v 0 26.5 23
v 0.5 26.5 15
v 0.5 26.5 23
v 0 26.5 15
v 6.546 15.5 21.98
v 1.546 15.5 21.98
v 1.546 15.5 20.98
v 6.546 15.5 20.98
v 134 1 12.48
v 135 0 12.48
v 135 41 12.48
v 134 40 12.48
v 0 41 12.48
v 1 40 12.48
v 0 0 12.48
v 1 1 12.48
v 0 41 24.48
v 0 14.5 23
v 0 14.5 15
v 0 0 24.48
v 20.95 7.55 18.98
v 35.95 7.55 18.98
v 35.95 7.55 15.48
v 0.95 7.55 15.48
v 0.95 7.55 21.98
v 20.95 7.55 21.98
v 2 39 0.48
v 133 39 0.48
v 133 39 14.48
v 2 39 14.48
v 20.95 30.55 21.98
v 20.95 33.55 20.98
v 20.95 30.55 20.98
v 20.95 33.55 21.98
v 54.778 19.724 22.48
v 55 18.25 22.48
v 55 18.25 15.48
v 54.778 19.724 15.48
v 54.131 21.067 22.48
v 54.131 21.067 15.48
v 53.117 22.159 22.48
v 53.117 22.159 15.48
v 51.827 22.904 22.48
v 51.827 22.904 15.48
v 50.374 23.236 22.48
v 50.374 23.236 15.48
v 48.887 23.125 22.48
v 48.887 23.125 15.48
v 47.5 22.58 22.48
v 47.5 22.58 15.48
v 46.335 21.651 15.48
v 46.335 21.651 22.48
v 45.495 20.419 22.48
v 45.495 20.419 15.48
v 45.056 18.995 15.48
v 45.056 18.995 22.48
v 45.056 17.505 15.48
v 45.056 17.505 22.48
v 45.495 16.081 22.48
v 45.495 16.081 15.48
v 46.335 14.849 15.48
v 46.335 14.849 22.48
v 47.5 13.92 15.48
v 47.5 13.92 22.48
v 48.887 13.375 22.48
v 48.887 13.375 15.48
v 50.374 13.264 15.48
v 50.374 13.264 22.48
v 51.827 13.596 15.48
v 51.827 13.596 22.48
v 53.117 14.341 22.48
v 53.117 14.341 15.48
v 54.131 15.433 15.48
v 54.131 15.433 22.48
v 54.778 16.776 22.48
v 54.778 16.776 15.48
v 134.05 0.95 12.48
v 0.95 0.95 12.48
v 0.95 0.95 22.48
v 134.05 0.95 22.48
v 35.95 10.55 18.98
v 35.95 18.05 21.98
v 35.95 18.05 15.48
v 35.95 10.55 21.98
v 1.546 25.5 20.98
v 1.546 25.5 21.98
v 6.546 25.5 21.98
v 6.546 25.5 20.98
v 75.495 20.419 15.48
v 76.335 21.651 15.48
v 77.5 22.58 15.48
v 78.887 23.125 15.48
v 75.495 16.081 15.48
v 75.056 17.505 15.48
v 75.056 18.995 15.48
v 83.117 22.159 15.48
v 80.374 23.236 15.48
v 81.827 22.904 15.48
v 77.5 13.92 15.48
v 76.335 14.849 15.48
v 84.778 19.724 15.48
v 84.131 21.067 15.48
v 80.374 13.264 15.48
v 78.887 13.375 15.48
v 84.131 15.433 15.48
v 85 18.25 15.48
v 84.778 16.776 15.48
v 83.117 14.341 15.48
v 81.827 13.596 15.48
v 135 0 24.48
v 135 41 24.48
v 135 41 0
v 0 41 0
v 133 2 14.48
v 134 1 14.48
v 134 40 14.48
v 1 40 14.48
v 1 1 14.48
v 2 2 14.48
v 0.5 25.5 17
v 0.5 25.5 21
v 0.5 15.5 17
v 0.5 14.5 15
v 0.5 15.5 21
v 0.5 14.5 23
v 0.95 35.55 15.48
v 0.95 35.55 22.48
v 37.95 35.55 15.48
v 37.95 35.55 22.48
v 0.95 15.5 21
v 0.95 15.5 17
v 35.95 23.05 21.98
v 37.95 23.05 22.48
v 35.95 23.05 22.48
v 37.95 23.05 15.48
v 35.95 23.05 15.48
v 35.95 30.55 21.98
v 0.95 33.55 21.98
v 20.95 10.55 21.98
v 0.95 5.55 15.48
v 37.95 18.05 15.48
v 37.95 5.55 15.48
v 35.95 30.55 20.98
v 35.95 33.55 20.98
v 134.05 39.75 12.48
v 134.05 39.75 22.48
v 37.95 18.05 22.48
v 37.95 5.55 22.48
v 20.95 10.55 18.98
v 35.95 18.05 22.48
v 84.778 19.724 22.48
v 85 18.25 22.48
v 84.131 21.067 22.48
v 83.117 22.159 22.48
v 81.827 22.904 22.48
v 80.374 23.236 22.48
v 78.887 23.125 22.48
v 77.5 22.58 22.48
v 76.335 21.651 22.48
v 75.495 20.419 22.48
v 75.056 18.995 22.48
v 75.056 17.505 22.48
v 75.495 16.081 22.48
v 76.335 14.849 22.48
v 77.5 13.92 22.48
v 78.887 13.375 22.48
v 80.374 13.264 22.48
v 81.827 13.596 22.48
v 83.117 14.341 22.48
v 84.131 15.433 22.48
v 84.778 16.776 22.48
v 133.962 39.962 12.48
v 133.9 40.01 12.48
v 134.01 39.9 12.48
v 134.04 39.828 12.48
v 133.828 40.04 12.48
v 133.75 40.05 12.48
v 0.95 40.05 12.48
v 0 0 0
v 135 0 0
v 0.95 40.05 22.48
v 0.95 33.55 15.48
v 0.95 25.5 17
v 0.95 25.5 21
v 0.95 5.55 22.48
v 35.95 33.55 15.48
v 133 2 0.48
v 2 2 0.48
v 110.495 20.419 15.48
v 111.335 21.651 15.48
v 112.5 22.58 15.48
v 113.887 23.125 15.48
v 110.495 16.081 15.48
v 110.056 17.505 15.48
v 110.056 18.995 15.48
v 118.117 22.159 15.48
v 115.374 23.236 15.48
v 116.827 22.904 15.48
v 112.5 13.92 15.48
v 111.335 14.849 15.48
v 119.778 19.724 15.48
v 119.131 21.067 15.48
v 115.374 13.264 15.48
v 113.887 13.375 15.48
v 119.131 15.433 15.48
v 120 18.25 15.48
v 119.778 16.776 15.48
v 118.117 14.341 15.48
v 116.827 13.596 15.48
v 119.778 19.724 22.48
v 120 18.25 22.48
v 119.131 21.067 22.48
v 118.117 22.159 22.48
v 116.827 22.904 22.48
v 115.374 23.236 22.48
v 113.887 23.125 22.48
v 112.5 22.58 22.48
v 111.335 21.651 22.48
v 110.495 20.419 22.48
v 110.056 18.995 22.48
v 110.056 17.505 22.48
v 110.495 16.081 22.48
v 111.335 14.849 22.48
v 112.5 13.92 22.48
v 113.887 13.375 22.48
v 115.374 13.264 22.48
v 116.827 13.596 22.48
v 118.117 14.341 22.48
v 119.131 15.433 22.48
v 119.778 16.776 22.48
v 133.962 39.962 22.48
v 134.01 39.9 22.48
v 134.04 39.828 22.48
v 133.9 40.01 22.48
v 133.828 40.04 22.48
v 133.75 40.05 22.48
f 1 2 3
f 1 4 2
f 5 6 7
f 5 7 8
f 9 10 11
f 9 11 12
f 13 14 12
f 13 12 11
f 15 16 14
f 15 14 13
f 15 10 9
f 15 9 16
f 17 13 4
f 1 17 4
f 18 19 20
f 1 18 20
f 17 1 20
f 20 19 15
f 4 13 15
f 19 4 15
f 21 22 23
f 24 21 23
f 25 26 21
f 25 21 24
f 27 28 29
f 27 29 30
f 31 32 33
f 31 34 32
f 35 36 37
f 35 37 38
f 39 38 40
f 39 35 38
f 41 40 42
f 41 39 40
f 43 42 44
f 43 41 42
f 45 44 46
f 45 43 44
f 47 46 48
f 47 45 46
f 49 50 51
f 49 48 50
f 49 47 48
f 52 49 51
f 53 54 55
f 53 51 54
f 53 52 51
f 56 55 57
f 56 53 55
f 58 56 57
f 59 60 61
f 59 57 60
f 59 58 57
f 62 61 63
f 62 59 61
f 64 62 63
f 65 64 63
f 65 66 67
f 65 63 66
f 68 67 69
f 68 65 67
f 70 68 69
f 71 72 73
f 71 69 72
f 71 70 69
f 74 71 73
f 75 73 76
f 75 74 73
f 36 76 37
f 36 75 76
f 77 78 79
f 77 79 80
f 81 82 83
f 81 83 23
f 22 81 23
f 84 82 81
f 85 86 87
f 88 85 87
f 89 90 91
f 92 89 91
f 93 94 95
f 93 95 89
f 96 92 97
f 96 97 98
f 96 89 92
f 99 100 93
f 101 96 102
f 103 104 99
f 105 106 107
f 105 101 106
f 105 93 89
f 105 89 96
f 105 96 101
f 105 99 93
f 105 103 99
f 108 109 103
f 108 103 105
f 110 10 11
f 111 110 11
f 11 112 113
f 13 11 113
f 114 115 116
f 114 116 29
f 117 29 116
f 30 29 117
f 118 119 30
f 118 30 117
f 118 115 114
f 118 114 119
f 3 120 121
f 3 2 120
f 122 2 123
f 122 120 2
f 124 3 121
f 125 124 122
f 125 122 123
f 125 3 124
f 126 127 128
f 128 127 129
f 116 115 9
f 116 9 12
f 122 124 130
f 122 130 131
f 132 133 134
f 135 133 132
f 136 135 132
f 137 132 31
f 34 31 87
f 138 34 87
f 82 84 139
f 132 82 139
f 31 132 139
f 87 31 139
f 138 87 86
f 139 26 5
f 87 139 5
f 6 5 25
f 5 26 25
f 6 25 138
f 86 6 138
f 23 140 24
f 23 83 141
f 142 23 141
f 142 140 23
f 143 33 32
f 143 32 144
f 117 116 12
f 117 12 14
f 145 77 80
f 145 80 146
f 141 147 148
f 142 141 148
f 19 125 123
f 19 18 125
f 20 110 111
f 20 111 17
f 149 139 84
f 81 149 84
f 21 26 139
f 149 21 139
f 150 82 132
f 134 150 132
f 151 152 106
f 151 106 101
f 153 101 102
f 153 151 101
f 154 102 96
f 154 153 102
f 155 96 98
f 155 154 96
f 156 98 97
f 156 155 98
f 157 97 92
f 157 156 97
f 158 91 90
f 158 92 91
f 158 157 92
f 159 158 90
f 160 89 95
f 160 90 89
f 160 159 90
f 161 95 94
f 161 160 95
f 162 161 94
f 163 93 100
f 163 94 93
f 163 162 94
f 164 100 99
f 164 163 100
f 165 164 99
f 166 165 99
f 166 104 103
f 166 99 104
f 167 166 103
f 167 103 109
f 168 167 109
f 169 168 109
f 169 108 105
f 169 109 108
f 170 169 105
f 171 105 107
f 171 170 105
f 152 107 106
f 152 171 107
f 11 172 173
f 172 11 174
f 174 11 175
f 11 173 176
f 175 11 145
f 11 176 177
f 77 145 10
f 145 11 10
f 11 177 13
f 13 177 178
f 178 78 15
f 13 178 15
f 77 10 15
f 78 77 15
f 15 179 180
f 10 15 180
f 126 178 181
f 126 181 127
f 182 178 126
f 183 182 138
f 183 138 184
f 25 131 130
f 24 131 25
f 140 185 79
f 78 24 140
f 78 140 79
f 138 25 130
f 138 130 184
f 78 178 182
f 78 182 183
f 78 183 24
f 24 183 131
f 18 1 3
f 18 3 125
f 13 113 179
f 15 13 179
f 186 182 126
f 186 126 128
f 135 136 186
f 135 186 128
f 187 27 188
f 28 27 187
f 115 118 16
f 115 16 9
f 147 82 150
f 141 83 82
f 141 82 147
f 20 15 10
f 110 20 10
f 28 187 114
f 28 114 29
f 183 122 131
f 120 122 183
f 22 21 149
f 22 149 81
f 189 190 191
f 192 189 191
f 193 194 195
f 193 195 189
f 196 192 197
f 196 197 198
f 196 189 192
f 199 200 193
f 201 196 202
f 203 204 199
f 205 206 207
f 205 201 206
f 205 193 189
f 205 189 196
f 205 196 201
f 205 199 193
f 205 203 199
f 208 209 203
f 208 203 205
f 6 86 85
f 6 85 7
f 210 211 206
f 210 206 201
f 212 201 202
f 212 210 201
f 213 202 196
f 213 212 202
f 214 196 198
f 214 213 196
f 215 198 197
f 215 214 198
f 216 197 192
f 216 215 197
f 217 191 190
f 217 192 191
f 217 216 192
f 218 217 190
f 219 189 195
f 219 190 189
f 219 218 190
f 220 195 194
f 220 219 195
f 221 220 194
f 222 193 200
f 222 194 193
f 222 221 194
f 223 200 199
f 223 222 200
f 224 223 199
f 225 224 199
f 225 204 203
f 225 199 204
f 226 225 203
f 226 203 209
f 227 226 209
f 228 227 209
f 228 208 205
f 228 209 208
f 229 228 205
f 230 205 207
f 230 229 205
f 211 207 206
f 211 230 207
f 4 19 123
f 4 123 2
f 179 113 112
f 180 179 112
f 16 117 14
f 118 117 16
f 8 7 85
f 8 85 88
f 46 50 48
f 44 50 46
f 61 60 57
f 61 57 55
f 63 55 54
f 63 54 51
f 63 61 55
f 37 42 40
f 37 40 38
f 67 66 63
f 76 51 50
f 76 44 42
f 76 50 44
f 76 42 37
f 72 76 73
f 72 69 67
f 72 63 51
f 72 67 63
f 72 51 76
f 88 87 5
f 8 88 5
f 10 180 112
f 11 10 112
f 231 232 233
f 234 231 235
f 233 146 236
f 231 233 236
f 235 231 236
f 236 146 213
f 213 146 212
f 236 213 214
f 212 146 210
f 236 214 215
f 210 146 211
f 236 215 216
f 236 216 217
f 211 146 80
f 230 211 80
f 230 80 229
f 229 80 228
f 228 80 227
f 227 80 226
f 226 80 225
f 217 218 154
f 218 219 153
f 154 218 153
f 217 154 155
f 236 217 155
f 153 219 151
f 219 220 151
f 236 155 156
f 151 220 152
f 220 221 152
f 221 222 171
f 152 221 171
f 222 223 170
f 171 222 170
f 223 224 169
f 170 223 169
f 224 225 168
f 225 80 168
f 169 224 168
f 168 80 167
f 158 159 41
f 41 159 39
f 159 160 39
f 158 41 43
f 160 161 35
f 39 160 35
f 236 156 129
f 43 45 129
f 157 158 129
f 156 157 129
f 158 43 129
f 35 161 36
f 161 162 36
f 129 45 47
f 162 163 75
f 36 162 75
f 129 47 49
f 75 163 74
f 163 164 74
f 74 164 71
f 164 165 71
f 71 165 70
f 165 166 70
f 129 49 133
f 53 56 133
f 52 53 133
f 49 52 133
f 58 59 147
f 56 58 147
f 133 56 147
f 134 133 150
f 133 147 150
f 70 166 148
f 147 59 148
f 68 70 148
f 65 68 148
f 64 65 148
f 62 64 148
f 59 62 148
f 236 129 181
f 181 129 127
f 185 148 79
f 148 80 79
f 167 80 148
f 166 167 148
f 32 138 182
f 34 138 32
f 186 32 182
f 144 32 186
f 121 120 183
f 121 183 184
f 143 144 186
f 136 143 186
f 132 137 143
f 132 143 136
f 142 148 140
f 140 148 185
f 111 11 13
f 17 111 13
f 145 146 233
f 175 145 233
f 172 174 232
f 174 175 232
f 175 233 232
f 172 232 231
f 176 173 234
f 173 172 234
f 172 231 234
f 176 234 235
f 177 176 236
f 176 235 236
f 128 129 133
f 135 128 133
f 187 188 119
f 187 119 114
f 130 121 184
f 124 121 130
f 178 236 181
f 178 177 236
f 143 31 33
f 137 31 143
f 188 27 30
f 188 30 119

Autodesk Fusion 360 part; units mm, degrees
sketch "Esquisse1" plane through (0, 0, 0) normal (0, 0, 1) x (1, 0, 0)
  line L0 (0, 0) -> (135, 0)
  line L1 (135, 0) -> (135, 41)
  line L2 (135, 41) -> (0, 41)
  line L3 (0, 41) -> (0, 0)
  dimension "d1" = 135
  dimension "d2" = 41
extrude "Extrusion3" add sketch "Esquisse1" along normal blind 0.48 makes body 1
sketch "Esquisse3" plane through (0, 0, 0.48) normal (0, 0, 1) x (-1, 0, 0)
  line L0 (0, -41) -> (0, 0)
  line L1 (0, 0) -> (-135, 0)
  line L2 (-135, 0) -> (-135, -41)
  line L3 (-135, -41) -> (0, -41)
  line L4 (-2, -2) -> (-133, -2)
  line L5 (-133, -2) -> (-133, -39)
  line L6 (-133, -39) -> (-2, -39)
  line L7 (-2, -39) -> (-2, -2)
  dimension "d11" = -2
extrude "Extrusion5" add sketch "Esquisse3" along normal blind 14 bodies 1
sketch "Esquisse4" plane through (0, 0, 14.48) normal (0, 0, 1) x (-1, 0, 0)
  line L0 (-2, -2) -> (-2, -39)
  line L1 (-2, -39) -> (-133, -39)
  line L2 (-133, -39) -> (-133, -2)
  line L3 (-133, -2) -> (-2, -2)
  line L4 (-135, -41) -> (0, -41)
  line L5 (0, -41) -> (0, 0)
  line L6 (0, 0) -> (-135, 0)
  line L7 (-135, 0) -> (-135, -41)
  line L8 (-1, -1) -> (-134, -1)
  line L9 (-134, -1) -> (-134, -40)
  line L10 (-134, -40) -> (-1, -40)
  line L11 (-1, -40) -> (-1, -1)
  dimension "d14" = -1
extrude "Extrusion6" cut sketch "Esquisse4" against normal blind 2 contours L4 L5 L6 L7 bodies 1
sketch "Esquisse4 (2)" plane through (0, 0, 12.48) normal (0, 0, 1) x (-1, 0, 0) in component "Couvercle"
  line L0 (-1, -1) -> (-1, -40)
  line L1 (-1, -40) -> (-134, -40)
  line L2 (-134, -40) -> (-134, -1)
  line L3 (-134, -1) -> (-1, -1)
  line L4 (-135, 0) -> (-135, -41)
  line L5 (-135, -41) -> (0, -41)
  line L6 (0, -41) -> (0, 0)
  line L7 (0, 0) -> (-135, 0)
  line L8 (0, 0) -> (-135, 0)
  line L9 (-135, 0) -> (-135, -41)
  line L10 (-135, -41) -> (0, -41)
  line L11 (0, -41) -> (0, 0)
  line L12 (-134.05, -40.05) -> (-0.95, -40.05)
  line L13 (-0.95, -40.05) -> (-0.95, -0.95)
  line L14 (-0.95, -0.95) -> (-134.05, -0.95)
  line L15 (-134.05, -0.95) -> (-134.05, -40.05)
  dimension "d28" = -0.95
extrude "Extrusion1" add sketch "Esquisse4 (2)" along normal blind 10 separate body contours L4 L5 L6 L7 L8 L9 L10 L11 makes body 2 in component "Couvercle"
sketch "Esquisse5" plane through (0, 0, 22.48) normal (0, 0, 1) x (-1, 0, 0) in component "Couvercle"
  line L0 (-134.05, -40.05) -> (-134.05, -0.95)
  line L1 (-134.05, -0.95) -> (-0.95, -0.95)
  line L2 (-0.95, -0.95) -> (-0.95, -40.05)
  line L3 (-0.95, -40.05) -> (-134.05, -40.05)
  line L4 (0, -41) -> (0, 0)
  line L5 (0, 0) -> (-135, 0)
  line L6 (-135, 0) -> (-135, -41)
  line L7 (-135, -41) -> (0, -41)
  line L8 (0, 0) -> (-135, 0)
  line L9 (-135, 0) -> (-135, -41)
  line L10 (-135, -41) -> (0, -41)
  line L11 (0, -41) -> (0, 0)
extrude "Extrusion2" add sketch "Esquisse5" along normal blind 2 contours L0 L1 L2 L3 | L4 L5 L6 L7 L8 L9 L10 L11 bodies 2 in component "Couvercle"
sketch "Esquisse7" plane through (0, 0, 22.48) normal (0, 0, -1) x (1, 0, 0) in component "Couvercle"
  line L0 (0.95, -40.05) -> (134.05, -40.05)
  line L1 (134.05, -40.05) -> (134.05, -0.95)
  line L2 (134.05, -0.95) -> (0.95, -0.95)
  line L3 (0.95, -0.95) -> (0.95, -40.05)
  line L4 (0.95, -33.55) -> (35.95, -33.55)
  line L5 (35.95, -33.55) -> (35.95, -7.55)
  line L6 (35.95, -7.55) -> (0.95, -7.55)
  line L7 (0.95, -7.55) -> (0.95, -33.55)
  line L8 (0.95, -35.55) -> (37.95, -35.55)
  line L9 (37.95, -35.55) -> (37.95, -5.55)
  line L10 (37.95, -5.55) -> (0.95, -5.55)
  dimension "d33" = 35
  dimension "d34" = 26
  dimension "d35" = 6.6
extrude "Extrusion3'" add sketch "Esquisse7" along normal blind 7 contours L3 L4 L5 L6 L8 L9 L10 bodies 2 in component "Couvercle"
sketch "Esquisse8" plane through (0, 0, 0) normal (-1, 0, 0) x (0, -1, 0) in component "Couvercle"
  line L0 (-41, 12.48) -> (0, 12.48)
  line L1 (0, 12.48) -> (0, 24.48)
  line L2 (0, 24.48) -> (-41, 24.48)
  line L3 (-41, 24.48) -> (-41, 12.48)
  line L4 (-25.5, 21) -> (-15.5, 21)
  line L5 (-15.5, 21) -> (-15.5, 17)
  line L6 (-15.5, 17) -> (-25.5, 17)
  line L7 (-25.5, 17) -> (-25.5, 21)
  line L8 (-26.5, 23) -> (-14.5, 23)
  line L9 (-14.5, 23) -> (-14.5, 15)
  line L10 (-14.5, 15) -> (-26.5, 15)
  line L11 (-26.5, 15) -> (-26.5, 23)
  dimension "d39" = 10
  dimension "d40" = 4
  dimension "d41" = 21
  dimension "d42" = 15.5
  dimension "d43" = 12
  dimension "d44" = 8
  dimension "d45" = 1
  dimension "d46" = 2
extrude "Extrusion4" cut sketch "Esquisse8" against normal up to surface (0.95 mm away) contours L4 L5 L6 L7 bodies 2 in component "Couvercle"
extrude "Extrusion5'" cut sketch "Esquisse8" against normal blind 0.5 contours L8 L9 L10 L11 bodies 2 in component "Couvercle"
fillet "Congé1" radius 0.3 1 edges at (134.05, 40.05, 17.48) on bodies 2 in component "Couvercle"
extrude "Extrusion6'" add 1 faces at (24.2833, 16.2167, 22.48) along direction (0, 0, -1) blind 0.5 on bodies 2 bodies 2 in component "Couvercle"
sketch "Esquisse9" plane through (0, 0, 15.48) normal (0, 0, -1) x (1, 0, 0) in component "Couvercle"
  line L0 (0.95, -33.55) -> (0.95, -35.55)
  line L1 (0.95, -35.55) -> (37.95, -35.55)
  line L2 (37.95, -35.55) -> (37.95, -5.55)
  line L3 (37.95, -5.55) -> (0.95, -5.55)
  line L4 (0.95, -5.55) -> (0.95, -7.55)
  line L5 (0.95, -7.55) -> (35.95, -7.55)
  line L6 (35.95, -7.55) -> (35.95, -33.55)
  line L7 (35.95, -33.55) -> (0.95, -33.55)
  line L8 (35.95, -20.55) -> (35.95, -18.05)
  line L9 (37.95, -18.05) -> (37.95, -23.05)
  line L10 (35.95, -18.05) -> (37.95, -18.05)
  line L11 (37.95, -23.05) -> (35.95, -23.05)
  line L12 (35.95, -20.55) -> (35.95, -18.05)
  line L13 (35.95, -23.05) -> (35.95, -20.55)
  dimension "d58" = 2.5
  dimension "d59" = 5
extrude "Extrusion7" cut sketch "Esquisse9" against normal up to surface (7 mm away) contours L2 L6 L8 L9 L10 L11 L12 L13 bodies 2 in component "Couvercle"
sketch "Esquisse10" plane through (0, 0, 22.48) normal (0, 0, -1) x (1, 0, 0) in component "Couvercle"
  arc A0 (133.75, -40.05) -> (134.05, -39.75) centre (133.75, -39.75) ccw
  line L0 (134.05, -39.75) -> (134.05, -0.95)
  line L1 (134.05, -0.95) -> (0.95, -0.95)
  line L2 (0.95, -0.95) -> (0.95, -5.55)
  line L3 (0.95, -5.55) -> (37.95, -5.55)
  line L4 (37.95, -5.55) -> (37.95, -18.05)
  line L5 (37.95, -18.05) -> (35.95, -18.05)
  line L6 (35.95, -18.05) -> (35.95, -23.05)
  line L7 (35.95, -23.05) -> (37.95, -23.05)
  line L8 (37.95, -23.05) -> (37.95, -35.55)
  line L9 (37.95, -35.55) -> (0.95, -35.55)
  line L10 (0.95, -35.55) -> (0.95, -40.05)
  line L11 (0.95, -40.05) -> (133.75, -40.05)
  circle A1 centre (115, -18.25) radius 5
  circle A2 centre (80, -18.25) radius 5
  circle A3 centre (50, -18.25) radius 5
  line L12 (135, 0) -> (135, -41)
  dimension "d62" = 10
  dimension "d63" = 10
  dimension "d66" = 10
  dimension "d67" = 20
  dimension "d70" = 35
  dimension "d71" = 30
extrude "Extrusion8" add sketch "Esquisse10" along normal blind 7 contours A1 | A2 | A3 bodies 2 in component "Couvercle"
sketch "Esquisse11" plane through (0, 0, 21.98) normal (0, 0, -1) x (1, 0, 0) in component "Couvercle"
  line L0 (35.95, -7.55) -> (0.95, -7.55)
  line L1 (0.95, -7.55) -> (0.95, -33.55)
  line L2 (0.95, -33.55) -> (35.95, -33.55)
  line L3 (35.95, -33.55) -> (35.95, -23.05)
  line L4 (35.95, -23.05) -> (35.95, -18.05)
  line L5 (35.95, -18.05) -> (35.95, -7.55)
  line L6 (35.95, -7.55) -> (20.95, -7.55)
  line L7 (20.95, -7.55) -> (20.95, -10.55)
  line L8 (20.95, -10.55) -> (35.95, -10.55)
  line L9 (35.95, -10.55) -> (35.95, -7.55)
  line L10 (35.95, -33.55) -> (20.95, -33.55)
  line L11 (20.95, -33.55) -> (20.95, -30.55)
  line L12 (20.95, -30.55) -> (35.95, -30.55)
  line L13 (35.95, -30.55) -> (35.95, -33.55)
  line L14 (1.5462, -20.5) -> (1.5462, -15.5)
  line L15 (1.5462, -20.5) -> (1.5462, -25.5)
  line L16 (1.5462, -15.5) -> (6.5462, -15.5)
  line L17 (1.5462, -25.5) -> (6.5462, -25.5)
  line L18 (6.5462, -25.5) -> (6.5462, -15.5)
  dimension "d72" = 15
  dimension "d73" = 3
  dimension "d76" = 15
  dimension "d77" = 3
  dimension "d78" = 5
  dimension "d79" = 5
  dimension "d80" = 5
  dimension "d81" = 5
extrude "Extrusion9" add sketch "Esquisse11" along normal blind 3 contours L0 L5 L6 L7 L8 L9 bodies 2 in component "Couvercle"
extrude "Extrusion10" add sketch "Esquisse11" along normal blind 1 contours L14 L15 L16 L17 L18 bodies 2 in component "Couvercle"
extrude "Extrusion11" add sketch "Esquisse11" along normal blind 1 contours L2 L3 L10 L11 L12 L13 bodies 2 in component "Couvercle"
sketch "Esquisse5 (2)" plane through (0, 0, 0.48) normal (0, 0, 1) x (-1, 0, 0)
  line L0 (-2, -2) -> (-133, -2)
  line L1 (-133, -2) -> (-133, -39)
  line L2 (-133, -39) -> (-2, -39)
  line L3 (-2, -39) -> (-2, -2)
  line L4 (-2, -39) -> (-133, -39)
  line L5 (-133, -39) -> (-133, -36)
  line L6 (-133, -36) -> (-2, -36)
  line L7 (-2, -36) -> (-2, -39)
  dimension "d47" = 3
extrude "Extrusion7'" [suppressed]
component "Couvercle" placed x (1, 0, 0) y (0, 1, 0) z (0, 0, 1) at (0, 0, 0)
